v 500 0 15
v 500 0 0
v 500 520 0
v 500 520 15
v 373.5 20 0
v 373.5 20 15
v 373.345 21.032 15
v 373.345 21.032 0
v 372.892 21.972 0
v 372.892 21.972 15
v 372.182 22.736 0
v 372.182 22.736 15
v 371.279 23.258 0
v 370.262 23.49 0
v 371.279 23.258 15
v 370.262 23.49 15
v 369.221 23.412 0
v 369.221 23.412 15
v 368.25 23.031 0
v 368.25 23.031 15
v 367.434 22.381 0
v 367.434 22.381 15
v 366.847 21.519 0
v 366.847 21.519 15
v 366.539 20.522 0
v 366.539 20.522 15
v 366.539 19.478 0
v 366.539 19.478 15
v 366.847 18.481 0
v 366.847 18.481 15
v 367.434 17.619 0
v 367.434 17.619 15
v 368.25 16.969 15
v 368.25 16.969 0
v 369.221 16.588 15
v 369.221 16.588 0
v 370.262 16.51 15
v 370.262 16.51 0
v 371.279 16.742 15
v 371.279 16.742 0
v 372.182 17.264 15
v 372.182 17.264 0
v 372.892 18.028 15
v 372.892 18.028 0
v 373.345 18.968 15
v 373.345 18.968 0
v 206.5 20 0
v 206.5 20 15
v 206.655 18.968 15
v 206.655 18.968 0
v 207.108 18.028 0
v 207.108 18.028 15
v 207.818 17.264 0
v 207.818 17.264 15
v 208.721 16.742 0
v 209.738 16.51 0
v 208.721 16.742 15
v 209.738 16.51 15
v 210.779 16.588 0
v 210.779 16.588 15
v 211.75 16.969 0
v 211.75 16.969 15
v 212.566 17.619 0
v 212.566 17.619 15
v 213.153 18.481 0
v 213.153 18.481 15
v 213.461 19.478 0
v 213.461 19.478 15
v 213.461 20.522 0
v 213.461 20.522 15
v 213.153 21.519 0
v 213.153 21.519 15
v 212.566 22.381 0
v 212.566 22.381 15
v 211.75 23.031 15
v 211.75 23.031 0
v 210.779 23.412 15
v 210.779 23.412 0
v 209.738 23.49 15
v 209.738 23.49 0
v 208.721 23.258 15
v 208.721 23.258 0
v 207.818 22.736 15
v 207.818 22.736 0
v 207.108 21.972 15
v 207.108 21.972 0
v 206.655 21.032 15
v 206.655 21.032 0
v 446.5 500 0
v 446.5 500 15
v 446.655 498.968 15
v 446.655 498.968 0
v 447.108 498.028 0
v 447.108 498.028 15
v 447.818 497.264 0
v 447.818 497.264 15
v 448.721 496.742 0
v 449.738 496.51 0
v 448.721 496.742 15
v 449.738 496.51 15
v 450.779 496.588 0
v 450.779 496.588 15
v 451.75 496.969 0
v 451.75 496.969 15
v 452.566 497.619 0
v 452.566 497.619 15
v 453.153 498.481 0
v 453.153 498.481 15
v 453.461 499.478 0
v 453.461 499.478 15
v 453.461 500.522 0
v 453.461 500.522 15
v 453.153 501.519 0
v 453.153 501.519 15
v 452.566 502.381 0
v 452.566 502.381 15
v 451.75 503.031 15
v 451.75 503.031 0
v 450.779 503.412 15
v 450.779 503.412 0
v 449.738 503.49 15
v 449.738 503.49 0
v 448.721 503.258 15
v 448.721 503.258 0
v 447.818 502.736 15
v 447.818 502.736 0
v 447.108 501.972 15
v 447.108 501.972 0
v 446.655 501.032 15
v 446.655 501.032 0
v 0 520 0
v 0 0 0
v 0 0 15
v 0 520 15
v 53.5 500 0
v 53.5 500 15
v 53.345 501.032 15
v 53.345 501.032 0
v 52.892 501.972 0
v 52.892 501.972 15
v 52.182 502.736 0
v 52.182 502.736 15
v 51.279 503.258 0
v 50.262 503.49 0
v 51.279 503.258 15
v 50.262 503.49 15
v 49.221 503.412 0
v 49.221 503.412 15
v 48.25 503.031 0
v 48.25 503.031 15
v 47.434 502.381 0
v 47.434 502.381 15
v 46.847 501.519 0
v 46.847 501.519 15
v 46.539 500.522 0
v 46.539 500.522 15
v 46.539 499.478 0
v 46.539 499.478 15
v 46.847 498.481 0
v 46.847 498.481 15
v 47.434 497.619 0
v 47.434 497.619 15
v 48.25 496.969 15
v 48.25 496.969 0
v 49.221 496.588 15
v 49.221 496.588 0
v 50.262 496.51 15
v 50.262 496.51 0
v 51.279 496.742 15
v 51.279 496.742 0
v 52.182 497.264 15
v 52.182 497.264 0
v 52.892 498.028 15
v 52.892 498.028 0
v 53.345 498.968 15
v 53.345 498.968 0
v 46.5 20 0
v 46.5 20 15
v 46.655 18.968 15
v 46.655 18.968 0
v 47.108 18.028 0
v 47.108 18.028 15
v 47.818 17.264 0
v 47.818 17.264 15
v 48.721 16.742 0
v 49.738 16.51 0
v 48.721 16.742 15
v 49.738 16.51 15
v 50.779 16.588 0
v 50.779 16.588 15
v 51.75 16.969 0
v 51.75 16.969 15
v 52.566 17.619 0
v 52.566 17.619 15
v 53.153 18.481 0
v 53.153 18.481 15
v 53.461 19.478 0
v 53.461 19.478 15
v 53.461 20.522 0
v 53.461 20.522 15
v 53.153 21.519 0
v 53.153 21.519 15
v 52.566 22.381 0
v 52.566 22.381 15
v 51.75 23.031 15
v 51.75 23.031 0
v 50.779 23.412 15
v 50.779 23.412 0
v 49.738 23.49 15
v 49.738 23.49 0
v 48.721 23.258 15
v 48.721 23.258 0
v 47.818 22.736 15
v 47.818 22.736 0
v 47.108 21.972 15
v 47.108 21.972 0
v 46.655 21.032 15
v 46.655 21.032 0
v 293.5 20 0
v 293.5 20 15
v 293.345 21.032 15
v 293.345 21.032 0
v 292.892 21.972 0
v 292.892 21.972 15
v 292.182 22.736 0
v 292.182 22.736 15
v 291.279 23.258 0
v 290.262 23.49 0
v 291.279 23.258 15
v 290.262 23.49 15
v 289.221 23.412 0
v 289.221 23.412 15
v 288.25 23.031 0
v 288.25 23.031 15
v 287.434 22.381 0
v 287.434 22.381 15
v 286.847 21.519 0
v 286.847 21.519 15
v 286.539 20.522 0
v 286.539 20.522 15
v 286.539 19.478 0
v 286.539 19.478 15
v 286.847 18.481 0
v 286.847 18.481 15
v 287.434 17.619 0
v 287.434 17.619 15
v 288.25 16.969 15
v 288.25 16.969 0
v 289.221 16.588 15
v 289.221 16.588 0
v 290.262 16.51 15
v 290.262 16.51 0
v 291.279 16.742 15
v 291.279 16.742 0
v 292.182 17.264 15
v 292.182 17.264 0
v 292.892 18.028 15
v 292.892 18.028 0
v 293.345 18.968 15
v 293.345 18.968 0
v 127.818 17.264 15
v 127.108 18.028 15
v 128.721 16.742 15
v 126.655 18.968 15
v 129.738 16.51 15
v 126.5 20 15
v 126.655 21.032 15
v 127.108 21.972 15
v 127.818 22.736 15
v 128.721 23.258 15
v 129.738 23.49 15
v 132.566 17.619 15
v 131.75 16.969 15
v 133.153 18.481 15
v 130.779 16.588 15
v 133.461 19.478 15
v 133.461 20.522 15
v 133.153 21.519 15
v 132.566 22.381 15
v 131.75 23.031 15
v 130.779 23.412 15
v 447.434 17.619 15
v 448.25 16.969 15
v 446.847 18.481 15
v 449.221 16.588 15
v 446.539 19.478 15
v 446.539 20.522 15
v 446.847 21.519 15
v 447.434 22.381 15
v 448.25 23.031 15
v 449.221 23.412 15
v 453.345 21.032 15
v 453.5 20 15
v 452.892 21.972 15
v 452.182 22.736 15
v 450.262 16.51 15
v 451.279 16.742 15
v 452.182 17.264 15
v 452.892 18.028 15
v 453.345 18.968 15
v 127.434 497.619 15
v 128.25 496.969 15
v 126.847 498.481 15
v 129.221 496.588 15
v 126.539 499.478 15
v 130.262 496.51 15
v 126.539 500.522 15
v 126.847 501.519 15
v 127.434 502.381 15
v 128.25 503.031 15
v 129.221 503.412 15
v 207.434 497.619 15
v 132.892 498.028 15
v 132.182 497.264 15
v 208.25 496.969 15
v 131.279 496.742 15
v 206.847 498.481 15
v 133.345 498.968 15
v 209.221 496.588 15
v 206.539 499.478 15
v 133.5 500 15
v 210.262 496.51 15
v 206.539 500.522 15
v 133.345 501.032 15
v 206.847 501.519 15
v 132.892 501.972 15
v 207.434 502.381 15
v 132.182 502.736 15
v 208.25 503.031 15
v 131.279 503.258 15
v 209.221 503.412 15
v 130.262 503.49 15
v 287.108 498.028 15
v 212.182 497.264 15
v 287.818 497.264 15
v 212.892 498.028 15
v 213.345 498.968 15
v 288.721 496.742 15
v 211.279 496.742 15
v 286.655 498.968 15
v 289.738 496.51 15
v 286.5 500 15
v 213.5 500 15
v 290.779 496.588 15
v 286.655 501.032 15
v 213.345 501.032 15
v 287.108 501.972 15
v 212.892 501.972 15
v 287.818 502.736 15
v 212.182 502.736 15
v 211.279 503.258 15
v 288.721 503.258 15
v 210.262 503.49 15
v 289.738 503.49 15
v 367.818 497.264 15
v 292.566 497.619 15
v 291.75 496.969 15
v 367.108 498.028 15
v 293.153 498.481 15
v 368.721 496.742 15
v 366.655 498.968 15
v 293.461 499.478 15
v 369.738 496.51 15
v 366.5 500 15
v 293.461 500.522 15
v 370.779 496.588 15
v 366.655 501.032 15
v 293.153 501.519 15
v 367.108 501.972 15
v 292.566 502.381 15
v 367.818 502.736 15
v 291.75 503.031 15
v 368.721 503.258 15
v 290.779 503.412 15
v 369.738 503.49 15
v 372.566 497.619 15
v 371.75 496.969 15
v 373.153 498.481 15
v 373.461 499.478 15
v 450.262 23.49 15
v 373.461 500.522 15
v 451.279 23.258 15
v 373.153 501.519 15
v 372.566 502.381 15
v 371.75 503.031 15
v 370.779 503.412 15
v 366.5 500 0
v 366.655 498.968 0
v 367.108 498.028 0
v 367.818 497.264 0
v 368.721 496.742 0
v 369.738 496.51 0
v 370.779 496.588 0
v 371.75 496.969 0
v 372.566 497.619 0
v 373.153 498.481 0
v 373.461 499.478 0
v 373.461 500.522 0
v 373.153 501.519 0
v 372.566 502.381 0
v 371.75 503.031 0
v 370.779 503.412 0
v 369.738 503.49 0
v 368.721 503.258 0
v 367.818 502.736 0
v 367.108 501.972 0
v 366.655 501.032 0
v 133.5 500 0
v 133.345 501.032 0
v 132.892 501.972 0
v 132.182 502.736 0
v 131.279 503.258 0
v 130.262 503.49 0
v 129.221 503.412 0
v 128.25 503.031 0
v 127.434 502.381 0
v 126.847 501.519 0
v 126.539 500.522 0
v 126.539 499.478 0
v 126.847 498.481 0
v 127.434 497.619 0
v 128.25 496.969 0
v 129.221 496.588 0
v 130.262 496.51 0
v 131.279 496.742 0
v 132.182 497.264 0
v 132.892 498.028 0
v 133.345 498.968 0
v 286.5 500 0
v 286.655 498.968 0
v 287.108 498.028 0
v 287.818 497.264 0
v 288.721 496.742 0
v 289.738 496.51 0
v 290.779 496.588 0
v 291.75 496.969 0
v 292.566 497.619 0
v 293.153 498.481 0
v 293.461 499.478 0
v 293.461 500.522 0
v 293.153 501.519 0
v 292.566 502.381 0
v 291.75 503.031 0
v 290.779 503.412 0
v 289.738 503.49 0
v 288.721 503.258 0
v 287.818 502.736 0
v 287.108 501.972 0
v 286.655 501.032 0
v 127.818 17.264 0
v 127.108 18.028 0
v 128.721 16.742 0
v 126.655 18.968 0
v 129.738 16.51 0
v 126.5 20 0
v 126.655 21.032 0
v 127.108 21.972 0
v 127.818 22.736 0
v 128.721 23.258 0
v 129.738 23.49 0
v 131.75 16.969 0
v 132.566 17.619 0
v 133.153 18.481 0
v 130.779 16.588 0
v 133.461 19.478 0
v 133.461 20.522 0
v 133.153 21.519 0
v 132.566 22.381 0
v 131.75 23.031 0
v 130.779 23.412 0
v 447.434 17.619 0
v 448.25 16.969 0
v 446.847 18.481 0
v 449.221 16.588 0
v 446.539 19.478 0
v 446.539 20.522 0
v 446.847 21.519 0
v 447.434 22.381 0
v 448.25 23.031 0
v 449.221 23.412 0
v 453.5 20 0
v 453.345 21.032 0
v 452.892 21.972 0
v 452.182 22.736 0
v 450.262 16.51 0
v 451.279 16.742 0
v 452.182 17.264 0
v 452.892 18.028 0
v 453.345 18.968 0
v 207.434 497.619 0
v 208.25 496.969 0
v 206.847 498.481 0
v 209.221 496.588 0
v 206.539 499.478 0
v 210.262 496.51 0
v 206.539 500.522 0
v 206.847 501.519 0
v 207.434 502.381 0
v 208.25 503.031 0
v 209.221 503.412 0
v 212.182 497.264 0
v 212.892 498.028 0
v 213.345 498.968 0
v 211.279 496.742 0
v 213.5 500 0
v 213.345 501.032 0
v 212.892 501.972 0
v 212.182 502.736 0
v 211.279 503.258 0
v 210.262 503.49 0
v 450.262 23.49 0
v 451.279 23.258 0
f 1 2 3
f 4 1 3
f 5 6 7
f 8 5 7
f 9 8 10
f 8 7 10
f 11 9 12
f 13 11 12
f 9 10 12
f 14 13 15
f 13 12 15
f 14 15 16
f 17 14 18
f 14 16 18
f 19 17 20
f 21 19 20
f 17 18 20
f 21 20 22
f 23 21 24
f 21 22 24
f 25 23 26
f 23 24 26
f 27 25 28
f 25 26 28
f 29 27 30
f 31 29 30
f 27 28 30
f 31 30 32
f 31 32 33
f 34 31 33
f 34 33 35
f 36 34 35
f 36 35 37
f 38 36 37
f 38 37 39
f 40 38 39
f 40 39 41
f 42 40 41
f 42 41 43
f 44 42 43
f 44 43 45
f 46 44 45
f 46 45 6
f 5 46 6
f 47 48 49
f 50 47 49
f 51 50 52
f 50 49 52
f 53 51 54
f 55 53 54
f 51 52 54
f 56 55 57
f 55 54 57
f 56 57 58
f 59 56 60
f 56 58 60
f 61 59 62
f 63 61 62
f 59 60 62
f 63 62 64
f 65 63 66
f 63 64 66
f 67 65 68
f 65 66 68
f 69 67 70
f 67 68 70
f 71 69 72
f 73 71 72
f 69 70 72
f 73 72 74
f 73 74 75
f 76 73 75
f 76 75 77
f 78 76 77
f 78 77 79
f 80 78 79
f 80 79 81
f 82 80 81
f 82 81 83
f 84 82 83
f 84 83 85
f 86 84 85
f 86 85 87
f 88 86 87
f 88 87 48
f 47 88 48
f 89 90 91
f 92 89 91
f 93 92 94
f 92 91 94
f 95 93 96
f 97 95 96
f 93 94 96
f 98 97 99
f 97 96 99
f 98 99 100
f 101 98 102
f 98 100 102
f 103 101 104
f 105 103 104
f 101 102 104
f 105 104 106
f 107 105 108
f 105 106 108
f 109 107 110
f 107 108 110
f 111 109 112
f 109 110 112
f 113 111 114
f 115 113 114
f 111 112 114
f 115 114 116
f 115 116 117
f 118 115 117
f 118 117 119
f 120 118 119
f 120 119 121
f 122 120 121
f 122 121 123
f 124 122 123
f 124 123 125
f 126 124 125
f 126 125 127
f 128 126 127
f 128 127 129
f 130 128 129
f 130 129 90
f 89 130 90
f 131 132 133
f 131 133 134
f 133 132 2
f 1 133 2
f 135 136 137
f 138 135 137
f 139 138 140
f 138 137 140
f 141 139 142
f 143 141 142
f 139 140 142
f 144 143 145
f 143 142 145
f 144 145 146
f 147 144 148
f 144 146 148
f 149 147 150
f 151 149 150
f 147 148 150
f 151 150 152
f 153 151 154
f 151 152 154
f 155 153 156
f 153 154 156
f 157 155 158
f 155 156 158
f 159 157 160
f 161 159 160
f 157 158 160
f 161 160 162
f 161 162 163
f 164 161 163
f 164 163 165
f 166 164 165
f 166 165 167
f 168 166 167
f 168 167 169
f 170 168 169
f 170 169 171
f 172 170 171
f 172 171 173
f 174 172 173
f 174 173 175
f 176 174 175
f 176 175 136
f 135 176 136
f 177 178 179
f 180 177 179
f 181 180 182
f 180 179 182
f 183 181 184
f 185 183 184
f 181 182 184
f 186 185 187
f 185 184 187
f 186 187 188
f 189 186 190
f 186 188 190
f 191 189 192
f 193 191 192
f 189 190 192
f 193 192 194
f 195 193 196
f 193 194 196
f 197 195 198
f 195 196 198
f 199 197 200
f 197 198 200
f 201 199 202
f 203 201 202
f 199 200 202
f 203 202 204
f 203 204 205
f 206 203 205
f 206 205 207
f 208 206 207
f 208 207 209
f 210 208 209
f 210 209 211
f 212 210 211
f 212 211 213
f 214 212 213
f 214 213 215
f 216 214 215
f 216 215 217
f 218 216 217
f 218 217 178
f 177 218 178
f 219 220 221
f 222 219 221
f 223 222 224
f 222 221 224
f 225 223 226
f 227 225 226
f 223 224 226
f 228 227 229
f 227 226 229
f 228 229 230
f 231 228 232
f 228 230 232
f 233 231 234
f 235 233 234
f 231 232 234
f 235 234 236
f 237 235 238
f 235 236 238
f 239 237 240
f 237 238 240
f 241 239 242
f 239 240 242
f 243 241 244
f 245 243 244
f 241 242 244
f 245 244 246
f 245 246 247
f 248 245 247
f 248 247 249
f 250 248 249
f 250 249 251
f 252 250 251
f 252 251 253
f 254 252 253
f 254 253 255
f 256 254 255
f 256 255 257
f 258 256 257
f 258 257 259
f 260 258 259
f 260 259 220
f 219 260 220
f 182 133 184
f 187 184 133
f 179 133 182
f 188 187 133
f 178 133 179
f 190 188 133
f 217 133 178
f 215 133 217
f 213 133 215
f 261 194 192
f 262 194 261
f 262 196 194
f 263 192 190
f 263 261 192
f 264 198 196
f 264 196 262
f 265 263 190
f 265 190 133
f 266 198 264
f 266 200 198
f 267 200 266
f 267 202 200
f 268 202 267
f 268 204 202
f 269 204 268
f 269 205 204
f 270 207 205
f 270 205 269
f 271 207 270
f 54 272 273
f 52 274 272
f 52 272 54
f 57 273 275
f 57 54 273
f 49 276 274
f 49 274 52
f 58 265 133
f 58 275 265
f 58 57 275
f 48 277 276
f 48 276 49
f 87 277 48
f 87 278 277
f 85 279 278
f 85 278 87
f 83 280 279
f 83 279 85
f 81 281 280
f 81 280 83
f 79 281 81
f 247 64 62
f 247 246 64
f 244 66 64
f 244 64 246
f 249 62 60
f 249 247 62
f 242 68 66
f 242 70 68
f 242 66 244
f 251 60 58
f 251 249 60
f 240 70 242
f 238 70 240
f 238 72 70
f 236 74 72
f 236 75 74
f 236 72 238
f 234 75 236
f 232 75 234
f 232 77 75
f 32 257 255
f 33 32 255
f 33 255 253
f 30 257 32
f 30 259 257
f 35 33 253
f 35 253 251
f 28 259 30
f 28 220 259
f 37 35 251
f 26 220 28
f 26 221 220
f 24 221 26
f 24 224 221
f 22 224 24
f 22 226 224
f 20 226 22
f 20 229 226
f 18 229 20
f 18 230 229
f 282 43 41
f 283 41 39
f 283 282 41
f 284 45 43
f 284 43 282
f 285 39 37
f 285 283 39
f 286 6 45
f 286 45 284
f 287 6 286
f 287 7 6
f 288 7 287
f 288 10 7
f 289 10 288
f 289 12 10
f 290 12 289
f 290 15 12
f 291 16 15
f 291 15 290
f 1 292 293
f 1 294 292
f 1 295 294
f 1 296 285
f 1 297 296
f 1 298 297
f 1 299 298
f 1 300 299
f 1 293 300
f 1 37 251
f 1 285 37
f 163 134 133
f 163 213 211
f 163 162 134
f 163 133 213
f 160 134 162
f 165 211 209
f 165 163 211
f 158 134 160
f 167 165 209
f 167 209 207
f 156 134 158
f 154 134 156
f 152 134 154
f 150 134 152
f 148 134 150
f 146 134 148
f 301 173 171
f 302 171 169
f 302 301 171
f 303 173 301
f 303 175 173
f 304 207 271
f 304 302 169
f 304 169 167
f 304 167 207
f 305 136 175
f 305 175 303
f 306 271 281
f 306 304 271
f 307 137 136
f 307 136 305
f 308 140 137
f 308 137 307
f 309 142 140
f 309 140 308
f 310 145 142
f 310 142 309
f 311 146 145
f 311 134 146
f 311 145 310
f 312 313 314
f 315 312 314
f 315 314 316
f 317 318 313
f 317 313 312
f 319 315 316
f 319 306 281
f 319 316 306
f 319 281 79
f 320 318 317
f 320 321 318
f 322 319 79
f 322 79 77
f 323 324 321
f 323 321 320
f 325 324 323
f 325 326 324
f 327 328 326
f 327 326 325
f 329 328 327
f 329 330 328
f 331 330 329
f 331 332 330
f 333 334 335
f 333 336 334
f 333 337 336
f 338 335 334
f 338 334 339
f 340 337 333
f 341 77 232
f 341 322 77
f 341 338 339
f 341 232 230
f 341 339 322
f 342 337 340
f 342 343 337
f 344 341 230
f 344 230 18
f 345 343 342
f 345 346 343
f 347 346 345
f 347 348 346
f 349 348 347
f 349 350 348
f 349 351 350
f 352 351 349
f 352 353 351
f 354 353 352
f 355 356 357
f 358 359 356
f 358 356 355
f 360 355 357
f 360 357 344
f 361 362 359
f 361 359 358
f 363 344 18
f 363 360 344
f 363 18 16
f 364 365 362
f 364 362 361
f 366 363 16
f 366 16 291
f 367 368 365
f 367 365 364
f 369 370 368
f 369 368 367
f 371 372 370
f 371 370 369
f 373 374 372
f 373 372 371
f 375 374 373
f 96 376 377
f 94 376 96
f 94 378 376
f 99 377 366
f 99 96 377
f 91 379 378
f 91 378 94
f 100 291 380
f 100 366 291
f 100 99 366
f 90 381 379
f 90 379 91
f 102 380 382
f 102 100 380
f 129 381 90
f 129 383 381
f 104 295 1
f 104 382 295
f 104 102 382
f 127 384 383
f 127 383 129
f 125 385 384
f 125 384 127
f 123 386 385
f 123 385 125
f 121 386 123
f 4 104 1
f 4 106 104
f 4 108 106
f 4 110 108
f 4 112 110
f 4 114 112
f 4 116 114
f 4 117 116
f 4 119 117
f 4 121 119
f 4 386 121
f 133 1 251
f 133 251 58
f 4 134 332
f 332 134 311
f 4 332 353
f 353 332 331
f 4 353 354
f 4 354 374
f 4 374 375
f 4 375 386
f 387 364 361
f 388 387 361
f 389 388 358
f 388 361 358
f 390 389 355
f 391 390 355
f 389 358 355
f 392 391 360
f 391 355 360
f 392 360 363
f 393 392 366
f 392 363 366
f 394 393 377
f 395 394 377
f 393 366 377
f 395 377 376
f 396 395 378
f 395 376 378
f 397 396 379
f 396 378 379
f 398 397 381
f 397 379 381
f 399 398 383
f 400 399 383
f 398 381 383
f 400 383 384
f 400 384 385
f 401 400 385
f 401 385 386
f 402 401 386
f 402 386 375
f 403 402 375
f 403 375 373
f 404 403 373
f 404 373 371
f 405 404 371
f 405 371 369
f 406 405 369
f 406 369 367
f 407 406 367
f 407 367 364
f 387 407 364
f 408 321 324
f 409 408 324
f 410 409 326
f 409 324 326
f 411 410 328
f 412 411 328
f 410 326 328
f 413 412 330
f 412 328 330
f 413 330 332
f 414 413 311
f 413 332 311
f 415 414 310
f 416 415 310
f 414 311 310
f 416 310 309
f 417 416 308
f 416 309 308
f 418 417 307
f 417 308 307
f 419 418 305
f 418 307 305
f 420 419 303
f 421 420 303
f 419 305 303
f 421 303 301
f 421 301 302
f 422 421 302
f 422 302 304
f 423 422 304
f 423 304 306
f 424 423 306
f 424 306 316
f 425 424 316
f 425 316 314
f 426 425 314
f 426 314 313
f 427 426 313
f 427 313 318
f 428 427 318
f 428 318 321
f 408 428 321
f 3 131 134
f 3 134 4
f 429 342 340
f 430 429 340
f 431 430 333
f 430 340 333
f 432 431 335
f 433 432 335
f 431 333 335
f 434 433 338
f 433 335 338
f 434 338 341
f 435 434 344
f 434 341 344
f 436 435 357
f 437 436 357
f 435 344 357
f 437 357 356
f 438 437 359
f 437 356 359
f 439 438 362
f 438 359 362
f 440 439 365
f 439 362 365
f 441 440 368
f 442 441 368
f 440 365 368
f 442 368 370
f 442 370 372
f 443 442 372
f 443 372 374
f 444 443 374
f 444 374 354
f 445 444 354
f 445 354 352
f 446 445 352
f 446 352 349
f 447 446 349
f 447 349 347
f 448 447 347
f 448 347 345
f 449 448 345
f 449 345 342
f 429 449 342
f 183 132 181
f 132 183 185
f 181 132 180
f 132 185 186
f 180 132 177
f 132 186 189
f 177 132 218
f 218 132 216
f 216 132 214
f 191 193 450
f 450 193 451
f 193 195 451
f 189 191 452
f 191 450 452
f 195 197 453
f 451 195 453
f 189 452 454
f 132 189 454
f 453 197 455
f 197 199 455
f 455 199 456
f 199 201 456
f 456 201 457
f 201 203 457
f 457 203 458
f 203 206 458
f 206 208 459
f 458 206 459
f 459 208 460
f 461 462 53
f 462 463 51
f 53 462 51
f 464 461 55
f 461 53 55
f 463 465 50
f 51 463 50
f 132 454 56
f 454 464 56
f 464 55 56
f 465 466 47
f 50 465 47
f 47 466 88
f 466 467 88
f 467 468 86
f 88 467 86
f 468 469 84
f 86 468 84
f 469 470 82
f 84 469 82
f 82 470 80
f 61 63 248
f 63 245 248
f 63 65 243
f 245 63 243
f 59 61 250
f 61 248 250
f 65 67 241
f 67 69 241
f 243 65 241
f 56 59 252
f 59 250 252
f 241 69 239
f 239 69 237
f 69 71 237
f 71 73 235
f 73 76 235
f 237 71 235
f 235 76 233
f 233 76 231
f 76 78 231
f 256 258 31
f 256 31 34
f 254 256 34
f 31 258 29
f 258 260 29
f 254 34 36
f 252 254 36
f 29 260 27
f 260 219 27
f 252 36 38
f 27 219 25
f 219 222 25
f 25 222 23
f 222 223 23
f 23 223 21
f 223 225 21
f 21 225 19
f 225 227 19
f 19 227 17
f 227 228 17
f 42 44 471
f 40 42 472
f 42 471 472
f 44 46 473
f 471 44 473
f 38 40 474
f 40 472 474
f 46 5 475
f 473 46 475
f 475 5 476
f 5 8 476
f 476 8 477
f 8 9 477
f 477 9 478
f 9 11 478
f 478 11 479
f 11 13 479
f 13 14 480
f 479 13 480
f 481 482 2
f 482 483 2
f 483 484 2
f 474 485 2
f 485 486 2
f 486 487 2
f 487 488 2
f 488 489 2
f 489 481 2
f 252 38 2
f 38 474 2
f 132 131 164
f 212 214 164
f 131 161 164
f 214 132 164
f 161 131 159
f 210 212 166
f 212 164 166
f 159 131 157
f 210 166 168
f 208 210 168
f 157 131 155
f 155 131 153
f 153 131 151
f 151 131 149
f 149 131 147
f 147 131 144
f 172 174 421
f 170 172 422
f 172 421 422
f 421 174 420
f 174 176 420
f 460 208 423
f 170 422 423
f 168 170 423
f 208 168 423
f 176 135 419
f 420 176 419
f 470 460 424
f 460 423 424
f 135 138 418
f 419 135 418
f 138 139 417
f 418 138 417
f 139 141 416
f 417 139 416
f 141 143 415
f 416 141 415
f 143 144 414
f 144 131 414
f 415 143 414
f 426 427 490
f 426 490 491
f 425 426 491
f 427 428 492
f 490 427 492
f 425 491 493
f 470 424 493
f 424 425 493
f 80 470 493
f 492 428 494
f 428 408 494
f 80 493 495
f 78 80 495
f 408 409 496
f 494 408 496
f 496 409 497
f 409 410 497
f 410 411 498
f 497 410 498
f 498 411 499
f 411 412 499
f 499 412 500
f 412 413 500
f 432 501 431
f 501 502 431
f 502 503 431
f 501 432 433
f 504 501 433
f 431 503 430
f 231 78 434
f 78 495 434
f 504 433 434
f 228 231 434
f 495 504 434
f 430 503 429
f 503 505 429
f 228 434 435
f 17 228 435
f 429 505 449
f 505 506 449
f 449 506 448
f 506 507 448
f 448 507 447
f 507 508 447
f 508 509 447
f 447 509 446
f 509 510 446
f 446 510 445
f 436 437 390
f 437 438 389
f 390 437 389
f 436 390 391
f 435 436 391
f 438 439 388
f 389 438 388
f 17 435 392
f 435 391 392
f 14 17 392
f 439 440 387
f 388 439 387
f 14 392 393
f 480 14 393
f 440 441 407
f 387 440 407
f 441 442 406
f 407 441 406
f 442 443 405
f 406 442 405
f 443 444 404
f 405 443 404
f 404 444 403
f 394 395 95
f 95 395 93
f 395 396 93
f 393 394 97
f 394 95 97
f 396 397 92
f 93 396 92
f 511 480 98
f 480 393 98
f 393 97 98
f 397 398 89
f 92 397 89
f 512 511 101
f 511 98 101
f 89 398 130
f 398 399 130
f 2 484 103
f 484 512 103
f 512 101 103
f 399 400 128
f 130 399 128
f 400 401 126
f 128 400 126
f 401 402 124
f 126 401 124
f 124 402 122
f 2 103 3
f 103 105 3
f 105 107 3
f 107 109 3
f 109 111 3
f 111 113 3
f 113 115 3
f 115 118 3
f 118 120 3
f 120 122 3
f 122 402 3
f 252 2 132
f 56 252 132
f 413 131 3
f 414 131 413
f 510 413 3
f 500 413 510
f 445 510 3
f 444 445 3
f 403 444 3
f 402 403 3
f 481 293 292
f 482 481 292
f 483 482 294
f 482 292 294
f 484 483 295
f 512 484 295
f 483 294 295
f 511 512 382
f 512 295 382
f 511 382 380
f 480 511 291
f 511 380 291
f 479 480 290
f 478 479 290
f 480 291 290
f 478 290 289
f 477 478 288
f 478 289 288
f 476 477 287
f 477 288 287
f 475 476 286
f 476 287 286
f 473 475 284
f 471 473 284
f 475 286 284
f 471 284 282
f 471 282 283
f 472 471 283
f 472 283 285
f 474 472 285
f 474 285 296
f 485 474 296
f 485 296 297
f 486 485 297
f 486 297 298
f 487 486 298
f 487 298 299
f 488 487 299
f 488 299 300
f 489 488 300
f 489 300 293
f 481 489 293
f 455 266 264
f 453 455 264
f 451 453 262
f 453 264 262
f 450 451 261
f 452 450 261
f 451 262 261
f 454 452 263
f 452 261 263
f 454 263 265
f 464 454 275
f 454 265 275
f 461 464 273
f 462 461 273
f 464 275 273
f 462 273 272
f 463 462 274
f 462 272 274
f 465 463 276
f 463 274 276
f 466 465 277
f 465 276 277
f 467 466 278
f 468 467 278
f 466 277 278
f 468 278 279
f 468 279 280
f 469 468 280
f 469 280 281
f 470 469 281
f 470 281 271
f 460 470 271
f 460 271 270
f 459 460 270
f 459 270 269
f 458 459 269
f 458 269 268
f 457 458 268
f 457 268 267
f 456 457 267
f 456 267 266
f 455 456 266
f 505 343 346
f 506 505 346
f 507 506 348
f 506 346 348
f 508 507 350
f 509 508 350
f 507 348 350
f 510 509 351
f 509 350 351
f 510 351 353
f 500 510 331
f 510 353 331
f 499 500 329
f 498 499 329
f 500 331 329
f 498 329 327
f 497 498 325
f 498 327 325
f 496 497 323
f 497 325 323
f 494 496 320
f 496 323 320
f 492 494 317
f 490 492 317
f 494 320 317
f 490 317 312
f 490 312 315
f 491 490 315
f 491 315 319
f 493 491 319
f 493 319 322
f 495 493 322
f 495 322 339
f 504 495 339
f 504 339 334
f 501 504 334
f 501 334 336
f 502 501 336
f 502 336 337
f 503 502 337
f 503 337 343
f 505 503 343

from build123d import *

# Parameters (mm, degrees)
ESQUISSE1_W             = 500
ESQUISSE1_H             = 520
BOSS_EXTRU_1_DEPTH      = 15
ESQUISSE2_R             = 3.5
ENL_V_MAT_EXTRU_1_DEPTH = 722.543484483


with BuildPart() as part:
    # Esquisse1 → Boss.-Extru.1 (new body)
    with BuildSketch(Plane.XY):
        with Locations((250, 260)):
            Rectangle(ESQUISSE1_W, ESQUISSE1_H)
    extrude(amount=BOSS_EXTRU_1_DEPTH)

    # Esquisse2 → Enlèv. mat.-Extru.1 (cut, through all)
    with BuildSketch(Plane.XY.offset(15)):
        with Locations((210, 500)):
            Circle(ESQUISSE2_R)
        with Locations(Location((290, 500, 0), (0, 0, 180))):
            Circle(ESQUISSE2_R)
        with Locations((130, 500)):
            Circle(ESQUISSE2_R)
        with Locations((50, 500)):
            Circle(ESQUISSE2_R)
        with Locations(Location((450, 500, 0), (0, 0, 180))):
            Circle(ESQUISSE2_R)
        with Locations(Location((370, 500, 0), (0, 0, 180))):
            Circle(ESQUISSE2_R)
        with Locations((370, 20)):
            Circle(ESQUISSE2_R)
        with Locations((450, 20)):
            Circle(ESQUISSE2_R)
        with Locations(Location((50, 20, 0), (0, 0, 180))):
            Circle(ESQUISSE2_R)
        with Locations(Location((130, 20, 0), (0, 0, 180))):
            Circle(ESQUISSE2_R)
        with Locations((290, 20)):
            Circle(ESQUISSE2_R)
        with Locations(Location((210, 20, 0), (0, 0, 180))):
            Circle(ESQUISSE2_R)
    extrude(amount=-ENL_V_MAT_EXTRU_1_DEPTH, mode=Mode.SUBTRACT)


solid = part.part
